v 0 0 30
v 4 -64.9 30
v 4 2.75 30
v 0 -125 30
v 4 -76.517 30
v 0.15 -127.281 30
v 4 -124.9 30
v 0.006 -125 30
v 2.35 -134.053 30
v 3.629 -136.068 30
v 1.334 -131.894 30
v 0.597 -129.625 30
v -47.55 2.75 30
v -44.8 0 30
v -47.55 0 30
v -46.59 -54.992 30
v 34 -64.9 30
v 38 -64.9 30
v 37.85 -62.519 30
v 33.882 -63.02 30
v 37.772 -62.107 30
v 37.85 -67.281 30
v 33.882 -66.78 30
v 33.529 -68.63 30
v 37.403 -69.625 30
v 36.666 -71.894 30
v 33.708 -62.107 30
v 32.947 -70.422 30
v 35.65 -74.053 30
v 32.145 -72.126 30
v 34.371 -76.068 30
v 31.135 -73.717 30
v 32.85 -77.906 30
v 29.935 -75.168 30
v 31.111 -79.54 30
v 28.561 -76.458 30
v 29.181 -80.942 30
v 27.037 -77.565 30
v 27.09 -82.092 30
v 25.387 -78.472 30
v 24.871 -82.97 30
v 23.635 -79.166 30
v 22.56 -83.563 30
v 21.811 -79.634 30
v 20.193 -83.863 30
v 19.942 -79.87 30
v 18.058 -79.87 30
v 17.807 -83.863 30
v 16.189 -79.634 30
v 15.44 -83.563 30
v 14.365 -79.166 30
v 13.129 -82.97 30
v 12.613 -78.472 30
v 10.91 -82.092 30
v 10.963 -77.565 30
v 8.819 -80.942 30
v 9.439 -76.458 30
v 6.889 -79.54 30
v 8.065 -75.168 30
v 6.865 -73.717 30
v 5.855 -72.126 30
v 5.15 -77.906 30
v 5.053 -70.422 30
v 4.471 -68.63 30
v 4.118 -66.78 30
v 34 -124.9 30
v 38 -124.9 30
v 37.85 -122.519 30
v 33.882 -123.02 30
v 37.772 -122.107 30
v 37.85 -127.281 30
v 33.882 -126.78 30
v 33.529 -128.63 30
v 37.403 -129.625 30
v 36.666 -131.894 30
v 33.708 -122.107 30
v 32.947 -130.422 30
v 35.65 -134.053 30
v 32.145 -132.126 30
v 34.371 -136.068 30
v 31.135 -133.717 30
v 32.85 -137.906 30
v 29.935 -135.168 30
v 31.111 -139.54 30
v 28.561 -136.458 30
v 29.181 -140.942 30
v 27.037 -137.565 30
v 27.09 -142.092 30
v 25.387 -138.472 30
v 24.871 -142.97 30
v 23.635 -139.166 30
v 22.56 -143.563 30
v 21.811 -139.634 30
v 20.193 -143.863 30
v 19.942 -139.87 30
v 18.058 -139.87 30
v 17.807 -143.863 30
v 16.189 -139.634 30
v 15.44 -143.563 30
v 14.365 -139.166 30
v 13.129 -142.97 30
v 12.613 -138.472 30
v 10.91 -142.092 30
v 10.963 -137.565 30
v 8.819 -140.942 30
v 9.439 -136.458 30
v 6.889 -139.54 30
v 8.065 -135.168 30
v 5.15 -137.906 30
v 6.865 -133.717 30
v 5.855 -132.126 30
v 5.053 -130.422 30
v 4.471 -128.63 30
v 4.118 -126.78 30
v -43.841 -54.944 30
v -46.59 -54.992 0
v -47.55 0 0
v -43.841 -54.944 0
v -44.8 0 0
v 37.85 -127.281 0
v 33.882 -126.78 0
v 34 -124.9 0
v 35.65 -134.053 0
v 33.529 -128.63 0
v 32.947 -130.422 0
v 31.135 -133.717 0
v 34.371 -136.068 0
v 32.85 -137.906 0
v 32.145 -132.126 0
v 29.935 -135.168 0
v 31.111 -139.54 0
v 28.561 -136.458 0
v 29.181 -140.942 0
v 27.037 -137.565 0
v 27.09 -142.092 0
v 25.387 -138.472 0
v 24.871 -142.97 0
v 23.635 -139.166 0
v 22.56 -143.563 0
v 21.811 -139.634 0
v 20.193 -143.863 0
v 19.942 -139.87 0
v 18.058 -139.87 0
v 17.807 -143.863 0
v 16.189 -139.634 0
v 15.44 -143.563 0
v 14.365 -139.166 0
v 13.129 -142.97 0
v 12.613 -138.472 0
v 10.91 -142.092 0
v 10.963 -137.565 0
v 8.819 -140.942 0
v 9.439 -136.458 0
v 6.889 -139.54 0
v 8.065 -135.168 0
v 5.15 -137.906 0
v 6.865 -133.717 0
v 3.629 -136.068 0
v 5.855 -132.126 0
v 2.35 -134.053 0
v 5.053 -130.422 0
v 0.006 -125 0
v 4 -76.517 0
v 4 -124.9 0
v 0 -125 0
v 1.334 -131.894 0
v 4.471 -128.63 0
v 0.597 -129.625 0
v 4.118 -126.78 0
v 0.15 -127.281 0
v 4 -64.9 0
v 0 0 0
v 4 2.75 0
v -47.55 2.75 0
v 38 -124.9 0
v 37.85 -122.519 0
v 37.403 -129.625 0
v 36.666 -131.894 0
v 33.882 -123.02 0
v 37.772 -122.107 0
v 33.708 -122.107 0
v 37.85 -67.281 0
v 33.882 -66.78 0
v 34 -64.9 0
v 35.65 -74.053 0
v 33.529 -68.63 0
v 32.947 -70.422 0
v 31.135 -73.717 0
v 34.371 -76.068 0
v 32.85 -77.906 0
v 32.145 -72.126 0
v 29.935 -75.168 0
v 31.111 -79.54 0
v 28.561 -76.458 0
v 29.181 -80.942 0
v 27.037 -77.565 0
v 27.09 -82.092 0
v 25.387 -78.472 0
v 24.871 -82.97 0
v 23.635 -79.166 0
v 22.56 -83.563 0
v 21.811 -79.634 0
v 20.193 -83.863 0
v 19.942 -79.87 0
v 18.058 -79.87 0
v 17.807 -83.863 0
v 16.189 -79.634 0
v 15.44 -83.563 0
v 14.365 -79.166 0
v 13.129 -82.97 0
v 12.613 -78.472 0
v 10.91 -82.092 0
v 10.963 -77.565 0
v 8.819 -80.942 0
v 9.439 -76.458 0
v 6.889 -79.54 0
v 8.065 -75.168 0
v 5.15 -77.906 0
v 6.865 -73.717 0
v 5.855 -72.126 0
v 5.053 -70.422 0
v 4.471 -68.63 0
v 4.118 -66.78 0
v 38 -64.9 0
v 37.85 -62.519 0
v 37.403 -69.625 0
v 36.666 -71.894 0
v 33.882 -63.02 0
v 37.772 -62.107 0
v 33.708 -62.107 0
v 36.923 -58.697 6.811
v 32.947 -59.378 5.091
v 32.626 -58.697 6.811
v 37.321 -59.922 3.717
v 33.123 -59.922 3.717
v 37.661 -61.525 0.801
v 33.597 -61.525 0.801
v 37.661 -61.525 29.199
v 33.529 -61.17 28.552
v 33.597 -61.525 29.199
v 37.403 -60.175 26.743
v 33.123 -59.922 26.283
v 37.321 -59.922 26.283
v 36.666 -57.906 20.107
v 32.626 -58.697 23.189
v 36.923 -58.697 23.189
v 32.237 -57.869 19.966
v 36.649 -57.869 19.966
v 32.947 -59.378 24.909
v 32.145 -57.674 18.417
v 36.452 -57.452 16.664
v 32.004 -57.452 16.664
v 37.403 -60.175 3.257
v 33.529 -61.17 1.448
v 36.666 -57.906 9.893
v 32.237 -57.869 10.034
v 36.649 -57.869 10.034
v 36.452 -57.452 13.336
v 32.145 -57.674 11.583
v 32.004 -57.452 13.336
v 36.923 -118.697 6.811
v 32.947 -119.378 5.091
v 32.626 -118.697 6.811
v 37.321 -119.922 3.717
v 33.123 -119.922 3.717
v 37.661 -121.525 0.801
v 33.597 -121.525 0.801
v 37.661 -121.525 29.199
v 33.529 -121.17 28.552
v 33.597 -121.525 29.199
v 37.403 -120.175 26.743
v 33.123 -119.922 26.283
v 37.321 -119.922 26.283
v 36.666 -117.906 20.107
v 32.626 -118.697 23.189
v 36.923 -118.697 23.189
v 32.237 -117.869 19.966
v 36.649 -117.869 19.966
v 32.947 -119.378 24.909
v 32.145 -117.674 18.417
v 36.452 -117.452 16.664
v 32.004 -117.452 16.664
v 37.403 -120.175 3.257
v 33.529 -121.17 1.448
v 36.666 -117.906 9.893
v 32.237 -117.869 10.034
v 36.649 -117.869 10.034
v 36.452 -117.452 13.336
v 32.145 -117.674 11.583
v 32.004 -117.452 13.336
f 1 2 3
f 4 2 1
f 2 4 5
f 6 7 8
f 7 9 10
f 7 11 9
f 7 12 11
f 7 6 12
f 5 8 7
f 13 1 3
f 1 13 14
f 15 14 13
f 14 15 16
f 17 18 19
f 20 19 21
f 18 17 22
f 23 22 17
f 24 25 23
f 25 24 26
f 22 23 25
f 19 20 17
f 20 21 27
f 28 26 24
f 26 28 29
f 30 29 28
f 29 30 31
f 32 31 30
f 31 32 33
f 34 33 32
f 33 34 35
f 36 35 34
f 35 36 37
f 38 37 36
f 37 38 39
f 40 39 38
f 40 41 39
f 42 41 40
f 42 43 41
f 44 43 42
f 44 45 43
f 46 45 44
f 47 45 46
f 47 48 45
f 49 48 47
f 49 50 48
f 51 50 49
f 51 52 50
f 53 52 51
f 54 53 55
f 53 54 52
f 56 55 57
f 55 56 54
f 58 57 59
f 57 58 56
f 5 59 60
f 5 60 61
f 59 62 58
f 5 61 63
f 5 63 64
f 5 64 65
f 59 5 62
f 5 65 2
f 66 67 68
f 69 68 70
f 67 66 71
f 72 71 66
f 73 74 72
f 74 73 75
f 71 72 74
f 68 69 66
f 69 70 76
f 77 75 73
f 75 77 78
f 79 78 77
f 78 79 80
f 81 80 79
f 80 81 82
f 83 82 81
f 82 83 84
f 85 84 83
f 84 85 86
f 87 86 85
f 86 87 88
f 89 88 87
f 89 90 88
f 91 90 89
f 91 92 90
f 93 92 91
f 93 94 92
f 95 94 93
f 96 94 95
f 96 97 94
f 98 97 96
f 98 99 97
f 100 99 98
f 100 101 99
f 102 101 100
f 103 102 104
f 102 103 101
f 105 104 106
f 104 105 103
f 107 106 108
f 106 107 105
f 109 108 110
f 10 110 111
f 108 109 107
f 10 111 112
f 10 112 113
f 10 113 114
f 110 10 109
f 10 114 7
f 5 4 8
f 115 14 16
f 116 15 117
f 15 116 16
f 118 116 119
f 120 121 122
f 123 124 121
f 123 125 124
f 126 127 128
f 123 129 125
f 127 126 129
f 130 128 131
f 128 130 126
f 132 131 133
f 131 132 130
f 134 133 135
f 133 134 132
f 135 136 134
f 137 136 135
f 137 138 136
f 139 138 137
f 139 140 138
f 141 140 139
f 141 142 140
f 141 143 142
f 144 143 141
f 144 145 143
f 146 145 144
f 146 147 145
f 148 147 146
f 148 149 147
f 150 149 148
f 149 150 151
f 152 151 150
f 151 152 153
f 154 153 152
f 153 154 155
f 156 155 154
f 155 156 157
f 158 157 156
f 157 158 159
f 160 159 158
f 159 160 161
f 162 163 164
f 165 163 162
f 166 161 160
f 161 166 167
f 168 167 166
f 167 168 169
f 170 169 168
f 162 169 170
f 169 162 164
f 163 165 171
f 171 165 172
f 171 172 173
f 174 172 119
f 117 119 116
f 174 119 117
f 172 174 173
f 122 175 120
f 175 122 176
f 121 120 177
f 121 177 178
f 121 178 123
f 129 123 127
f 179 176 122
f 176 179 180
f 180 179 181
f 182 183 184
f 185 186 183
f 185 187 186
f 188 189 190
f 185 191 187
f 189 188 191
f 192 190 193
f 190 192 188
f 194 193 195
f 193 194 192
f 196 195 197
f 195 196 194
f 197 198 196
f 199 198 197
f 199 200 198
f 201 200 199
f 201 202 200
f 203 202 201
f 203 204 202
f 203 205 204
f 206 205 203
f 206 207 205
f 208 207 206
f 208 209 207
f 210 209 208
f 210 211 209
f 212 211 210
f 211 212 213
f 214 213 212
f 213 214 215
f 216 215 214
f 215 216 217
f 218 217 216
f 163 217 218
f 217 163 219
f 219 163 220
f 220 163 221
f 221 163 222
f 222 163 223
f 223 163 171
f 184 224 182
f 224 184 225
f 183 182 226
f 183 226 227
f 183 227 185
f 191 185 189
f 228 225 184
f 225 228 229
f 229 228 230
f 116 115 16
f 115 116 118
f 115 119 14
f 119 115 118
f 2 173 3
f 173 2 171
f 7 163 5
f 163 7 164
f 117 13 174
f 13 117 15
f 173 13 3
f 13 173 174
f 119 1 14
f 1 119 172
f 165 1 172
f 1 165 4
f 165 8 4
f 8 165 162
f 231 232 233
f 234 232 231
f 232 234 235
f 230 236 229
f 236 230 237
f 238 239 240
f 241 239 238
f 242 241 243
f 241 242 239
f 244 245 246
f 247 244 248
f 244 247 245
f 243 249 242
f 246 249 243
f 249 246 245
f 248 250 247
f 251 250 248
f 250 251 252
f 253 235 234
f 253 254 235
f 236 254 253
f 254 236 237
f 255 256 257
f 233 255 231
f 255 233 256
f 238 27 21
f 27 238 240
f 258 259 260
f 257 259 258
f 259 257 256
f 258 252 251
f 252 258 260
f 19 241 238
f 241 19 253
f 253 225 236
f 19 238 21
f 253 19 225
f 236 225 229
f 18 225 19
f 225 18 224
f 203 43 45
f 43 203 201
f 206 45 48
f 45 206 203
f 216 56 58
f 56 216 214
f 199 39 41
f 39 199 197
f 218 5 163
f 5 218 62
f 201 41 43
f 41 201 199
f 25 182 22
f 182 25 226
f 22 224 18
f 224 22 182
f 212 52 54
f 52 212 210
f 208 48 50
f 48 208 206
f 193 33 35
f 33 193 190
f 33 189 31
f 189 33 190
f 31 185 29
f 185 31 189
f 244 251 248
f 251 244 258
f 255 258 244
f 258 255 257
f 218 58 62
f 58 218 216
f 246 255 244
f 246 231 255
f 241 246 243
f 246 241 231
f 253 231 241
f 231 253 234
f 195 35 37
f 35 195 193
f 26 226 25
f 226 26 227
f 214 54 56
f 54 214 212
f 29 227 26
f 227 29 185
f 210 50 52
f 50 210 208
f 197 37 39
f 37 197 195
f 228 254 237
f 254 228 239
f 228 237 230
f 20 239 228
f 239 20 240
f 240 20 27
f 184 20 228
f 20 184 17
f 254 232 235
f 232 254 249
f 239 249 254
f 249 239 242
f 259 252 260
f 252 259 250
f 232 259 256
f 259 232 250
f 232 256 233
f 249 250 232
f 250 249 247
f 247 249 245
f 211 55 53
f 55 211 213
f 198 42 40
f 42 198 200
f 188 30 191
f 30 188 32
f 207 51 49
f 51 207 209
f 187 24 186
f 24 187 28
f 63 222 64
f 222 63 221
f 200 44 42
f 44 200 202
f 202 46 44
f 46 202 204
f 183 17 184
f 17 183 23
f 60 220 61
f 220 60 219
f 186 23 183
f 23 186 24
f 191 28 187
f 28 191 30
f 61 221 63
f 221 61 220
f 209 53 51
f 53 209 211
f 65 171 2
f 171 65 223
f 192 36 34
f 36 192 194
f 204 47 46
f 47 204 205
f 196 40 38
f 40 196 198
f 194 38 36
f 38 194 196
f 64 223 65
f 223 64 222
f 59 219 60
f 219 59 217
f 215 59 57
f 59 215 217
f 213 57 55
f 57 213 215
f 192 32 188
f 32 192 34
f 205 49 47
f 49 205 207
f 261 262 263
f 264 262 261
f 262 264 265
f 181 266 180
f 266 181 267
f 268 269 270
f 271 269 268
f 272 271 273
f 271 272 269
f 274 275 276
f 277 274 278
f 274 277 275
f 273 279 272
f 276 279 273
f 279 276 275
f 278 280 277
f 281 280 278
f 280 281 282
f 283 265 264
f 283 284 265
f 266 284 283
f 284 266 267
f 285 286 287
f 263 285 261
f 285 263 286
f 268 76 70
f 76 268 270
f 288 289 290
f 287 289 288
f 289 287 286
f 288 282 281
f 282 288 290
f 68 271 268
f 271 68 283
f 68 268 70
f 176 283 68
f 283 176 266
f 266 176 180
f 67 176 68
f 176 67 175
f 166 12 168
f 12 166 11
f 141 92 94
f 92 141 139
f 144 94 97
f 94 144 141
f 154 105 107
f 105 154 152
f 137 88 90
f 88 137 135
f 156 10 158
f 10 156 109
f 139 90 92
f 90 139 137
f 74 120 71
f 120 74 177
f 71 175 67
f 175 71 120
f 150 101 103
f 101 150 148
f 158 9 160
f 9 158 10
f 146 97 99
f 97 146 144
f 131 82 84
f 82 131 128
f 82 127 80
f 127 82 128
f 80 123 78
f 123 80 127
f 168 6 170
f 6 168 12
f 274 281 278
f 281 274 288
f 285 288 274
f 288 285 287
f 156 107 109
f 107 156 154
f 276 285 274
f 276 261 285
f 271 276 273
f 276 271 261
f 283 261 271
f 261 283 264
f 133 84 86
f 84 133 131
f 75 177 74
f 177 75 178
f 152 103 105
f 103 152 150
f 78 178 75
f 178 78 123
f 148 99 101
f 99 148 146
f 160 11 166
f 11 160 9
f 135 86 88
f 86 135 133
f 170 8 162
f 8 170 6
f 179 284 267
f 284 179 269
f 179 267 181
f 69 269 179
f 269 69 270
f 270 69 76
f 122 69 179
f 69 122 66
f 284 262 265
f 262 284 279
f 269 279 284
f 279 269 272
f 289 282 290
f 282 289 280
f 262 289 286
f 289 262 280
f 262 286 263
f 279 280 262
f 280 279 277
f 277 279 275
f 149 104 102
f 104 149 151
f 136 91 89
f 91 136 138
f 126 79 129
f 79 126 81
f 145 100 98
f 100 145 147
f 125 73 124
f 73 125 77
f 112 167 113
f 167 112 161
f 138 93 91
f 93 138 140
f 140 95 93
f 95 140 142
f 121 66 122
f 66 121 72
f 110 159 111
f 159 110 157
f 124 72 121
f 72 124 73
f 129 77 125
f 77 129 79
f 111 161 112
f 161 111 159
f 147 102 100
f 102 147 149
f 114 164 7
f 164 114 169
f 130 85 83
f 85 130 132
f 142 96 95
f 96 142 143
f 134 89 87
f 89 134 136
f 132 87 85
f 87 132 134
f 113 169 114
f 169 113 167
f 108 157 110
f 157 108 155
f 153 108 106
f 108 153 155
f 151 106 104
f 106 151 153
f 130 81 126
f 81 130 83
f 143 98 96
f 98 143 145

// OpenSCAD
/* [Door parameters] */
// Door thickness (inner distance between front and back of door hook)
clip_depth = 44.8;
// Thickness of top and overhang (make sure it fits gap between door and frame)
top_and_back_thickness = 2.75;

/* [Hook parameters] */
// Width of entire hook
width = 30;
// Thickness of front piece and hanger hooks
hook_and_front_thickness = 4;
// Length of overhang on back side of the door
clip_length = 55;


number_of_hooks = 2;
// Distance between top of door and first hanger hook
first_hook_offset = 65;  // rounded: 60
// Distance between successive hanger hooks (if more than one)
hook_distance = 60;  // rounded: 60
// Radius of hanger hook curve
hook_radius = 15;

hook_style = "rounded"; // [simple:Simple,rounded:Rounded]

/* [Advanced] */

// Angle back of clip inwards (towards door), to help with friction; don't go crazy with this or you'll put too much stress on clip
clip_angle = 1;
// Add support buttress on hooks (except last); might help reduce flex, but looks a bit uglier (IMO)
inner_hook_buttress = 0; // [0:No,1:Yes]


/* [Hidden] */

$fn = 50;
thickness = hook_and_front_thickness;
top_thickness = top_and_back_thickness;

module hook_base() {
  difference() {
    cylinder(h=width, r=hook_radius+thickness);
    translate([0,0,-1])
      cylinder(h=width+2, r=hook_radius);
    translate([-hook_radius-thickness-1, 0, -1]) 
      cube([2*(hook_radius+thickness+1), hook_radius+thickness+1, width+2]); 
  }
}

module simple_hook() {
  translate([hook_radius+thickness, 0, 0]) union() {
    hook_base();
    translate([hook_radius+thickness/2, 0, 0])
      cylinder(h=width, r=thickness/2, $fn=18);
  }
}

module rounded_hook0() {
  translate([hook_radius+thickness, 0, 0]) union(r=2) {
    hook_base();
    translate([thickness+hook_radius, 0, width/2]) rotate([0, 90, 180]) difference() {
      cylinder(h=thickness, r=width/2);
      //translate([-width/2, -width/2, 0]) cube([width,width,thickness]);
      translate([-width-1, .5, -1])
        cube([2*width+2, width+1, thickness+2]);
    }
  }
}

module rounded_hook() {
  translate([0, -hook_radius-thickness, 0]) difference() {
    intersection() {
      cube([2*(hook_radius+thickness), 1.5*hook_radius+thickness+1, width]);
      translate([0, 0, width/2]) rotate([0, 90, 0]) cylinder(h=2*(hook_radius+thickness), r=1.5*hook_radius+thickness);
      translate([hook_radius+thickness, hook_radius+thickness, -1]) cylinder(r=hook_radius+thickness, h=width+2);
    }
    translate([hook_radius+thickness, hook_radius+thickness, -1]) cylinder(r=hook_radius, h=width+2);
    translate([-1, hook_radius+thickness, -1]) cube([hook_radius+thickness+2, hook_radius, width+2]);
  }
}

module hook() {
  if (hook_style == "simple") {
    simple_hook();
  } else if (hook_style == "rounded") {
    rounded_hook();
  }
}

module clip() {
  front_length = first_hook_offset + (number_of_hooks - 1) * hook_distance;
  union() {
    translate([-clip_depth-top_thickness, 0, 0]) rotate([0, 0, clip_angle]) translate([0, -clip_length, 0])
      cube([top_thickness, clip_length, width]);
    translate([-clip_depth-top_thickness, 0, 0])
      cube([clip_depth + top_thickness + thickness, top_thickness, width]);
    translate([0, -front_length, 0])
      cube([thickness, front_length, width]);
  }
}

module door_hook() {
  butt_theta = acos(hook_radius/(hook_radius+thickness));
  clip();
  for (i = [0:(number_of_hooks-1)]) {
    translate([0, -first_hook_offset-i*hook_distance+.1, 0]) union() {
      hook();
      if ((i < number_of_hooks-1) && (inner_hook_buttress != 0)) {
        translate([0,-(hook_radius+thickness)*tan(butt_theta),0]) rotate([0, 0, butt_theta]) translate([0, -thickness, 0]) cube([thickness*(1+1/cos(butt_theta)),thickness,width]);
      }
    }
  }
}

door_hook();
